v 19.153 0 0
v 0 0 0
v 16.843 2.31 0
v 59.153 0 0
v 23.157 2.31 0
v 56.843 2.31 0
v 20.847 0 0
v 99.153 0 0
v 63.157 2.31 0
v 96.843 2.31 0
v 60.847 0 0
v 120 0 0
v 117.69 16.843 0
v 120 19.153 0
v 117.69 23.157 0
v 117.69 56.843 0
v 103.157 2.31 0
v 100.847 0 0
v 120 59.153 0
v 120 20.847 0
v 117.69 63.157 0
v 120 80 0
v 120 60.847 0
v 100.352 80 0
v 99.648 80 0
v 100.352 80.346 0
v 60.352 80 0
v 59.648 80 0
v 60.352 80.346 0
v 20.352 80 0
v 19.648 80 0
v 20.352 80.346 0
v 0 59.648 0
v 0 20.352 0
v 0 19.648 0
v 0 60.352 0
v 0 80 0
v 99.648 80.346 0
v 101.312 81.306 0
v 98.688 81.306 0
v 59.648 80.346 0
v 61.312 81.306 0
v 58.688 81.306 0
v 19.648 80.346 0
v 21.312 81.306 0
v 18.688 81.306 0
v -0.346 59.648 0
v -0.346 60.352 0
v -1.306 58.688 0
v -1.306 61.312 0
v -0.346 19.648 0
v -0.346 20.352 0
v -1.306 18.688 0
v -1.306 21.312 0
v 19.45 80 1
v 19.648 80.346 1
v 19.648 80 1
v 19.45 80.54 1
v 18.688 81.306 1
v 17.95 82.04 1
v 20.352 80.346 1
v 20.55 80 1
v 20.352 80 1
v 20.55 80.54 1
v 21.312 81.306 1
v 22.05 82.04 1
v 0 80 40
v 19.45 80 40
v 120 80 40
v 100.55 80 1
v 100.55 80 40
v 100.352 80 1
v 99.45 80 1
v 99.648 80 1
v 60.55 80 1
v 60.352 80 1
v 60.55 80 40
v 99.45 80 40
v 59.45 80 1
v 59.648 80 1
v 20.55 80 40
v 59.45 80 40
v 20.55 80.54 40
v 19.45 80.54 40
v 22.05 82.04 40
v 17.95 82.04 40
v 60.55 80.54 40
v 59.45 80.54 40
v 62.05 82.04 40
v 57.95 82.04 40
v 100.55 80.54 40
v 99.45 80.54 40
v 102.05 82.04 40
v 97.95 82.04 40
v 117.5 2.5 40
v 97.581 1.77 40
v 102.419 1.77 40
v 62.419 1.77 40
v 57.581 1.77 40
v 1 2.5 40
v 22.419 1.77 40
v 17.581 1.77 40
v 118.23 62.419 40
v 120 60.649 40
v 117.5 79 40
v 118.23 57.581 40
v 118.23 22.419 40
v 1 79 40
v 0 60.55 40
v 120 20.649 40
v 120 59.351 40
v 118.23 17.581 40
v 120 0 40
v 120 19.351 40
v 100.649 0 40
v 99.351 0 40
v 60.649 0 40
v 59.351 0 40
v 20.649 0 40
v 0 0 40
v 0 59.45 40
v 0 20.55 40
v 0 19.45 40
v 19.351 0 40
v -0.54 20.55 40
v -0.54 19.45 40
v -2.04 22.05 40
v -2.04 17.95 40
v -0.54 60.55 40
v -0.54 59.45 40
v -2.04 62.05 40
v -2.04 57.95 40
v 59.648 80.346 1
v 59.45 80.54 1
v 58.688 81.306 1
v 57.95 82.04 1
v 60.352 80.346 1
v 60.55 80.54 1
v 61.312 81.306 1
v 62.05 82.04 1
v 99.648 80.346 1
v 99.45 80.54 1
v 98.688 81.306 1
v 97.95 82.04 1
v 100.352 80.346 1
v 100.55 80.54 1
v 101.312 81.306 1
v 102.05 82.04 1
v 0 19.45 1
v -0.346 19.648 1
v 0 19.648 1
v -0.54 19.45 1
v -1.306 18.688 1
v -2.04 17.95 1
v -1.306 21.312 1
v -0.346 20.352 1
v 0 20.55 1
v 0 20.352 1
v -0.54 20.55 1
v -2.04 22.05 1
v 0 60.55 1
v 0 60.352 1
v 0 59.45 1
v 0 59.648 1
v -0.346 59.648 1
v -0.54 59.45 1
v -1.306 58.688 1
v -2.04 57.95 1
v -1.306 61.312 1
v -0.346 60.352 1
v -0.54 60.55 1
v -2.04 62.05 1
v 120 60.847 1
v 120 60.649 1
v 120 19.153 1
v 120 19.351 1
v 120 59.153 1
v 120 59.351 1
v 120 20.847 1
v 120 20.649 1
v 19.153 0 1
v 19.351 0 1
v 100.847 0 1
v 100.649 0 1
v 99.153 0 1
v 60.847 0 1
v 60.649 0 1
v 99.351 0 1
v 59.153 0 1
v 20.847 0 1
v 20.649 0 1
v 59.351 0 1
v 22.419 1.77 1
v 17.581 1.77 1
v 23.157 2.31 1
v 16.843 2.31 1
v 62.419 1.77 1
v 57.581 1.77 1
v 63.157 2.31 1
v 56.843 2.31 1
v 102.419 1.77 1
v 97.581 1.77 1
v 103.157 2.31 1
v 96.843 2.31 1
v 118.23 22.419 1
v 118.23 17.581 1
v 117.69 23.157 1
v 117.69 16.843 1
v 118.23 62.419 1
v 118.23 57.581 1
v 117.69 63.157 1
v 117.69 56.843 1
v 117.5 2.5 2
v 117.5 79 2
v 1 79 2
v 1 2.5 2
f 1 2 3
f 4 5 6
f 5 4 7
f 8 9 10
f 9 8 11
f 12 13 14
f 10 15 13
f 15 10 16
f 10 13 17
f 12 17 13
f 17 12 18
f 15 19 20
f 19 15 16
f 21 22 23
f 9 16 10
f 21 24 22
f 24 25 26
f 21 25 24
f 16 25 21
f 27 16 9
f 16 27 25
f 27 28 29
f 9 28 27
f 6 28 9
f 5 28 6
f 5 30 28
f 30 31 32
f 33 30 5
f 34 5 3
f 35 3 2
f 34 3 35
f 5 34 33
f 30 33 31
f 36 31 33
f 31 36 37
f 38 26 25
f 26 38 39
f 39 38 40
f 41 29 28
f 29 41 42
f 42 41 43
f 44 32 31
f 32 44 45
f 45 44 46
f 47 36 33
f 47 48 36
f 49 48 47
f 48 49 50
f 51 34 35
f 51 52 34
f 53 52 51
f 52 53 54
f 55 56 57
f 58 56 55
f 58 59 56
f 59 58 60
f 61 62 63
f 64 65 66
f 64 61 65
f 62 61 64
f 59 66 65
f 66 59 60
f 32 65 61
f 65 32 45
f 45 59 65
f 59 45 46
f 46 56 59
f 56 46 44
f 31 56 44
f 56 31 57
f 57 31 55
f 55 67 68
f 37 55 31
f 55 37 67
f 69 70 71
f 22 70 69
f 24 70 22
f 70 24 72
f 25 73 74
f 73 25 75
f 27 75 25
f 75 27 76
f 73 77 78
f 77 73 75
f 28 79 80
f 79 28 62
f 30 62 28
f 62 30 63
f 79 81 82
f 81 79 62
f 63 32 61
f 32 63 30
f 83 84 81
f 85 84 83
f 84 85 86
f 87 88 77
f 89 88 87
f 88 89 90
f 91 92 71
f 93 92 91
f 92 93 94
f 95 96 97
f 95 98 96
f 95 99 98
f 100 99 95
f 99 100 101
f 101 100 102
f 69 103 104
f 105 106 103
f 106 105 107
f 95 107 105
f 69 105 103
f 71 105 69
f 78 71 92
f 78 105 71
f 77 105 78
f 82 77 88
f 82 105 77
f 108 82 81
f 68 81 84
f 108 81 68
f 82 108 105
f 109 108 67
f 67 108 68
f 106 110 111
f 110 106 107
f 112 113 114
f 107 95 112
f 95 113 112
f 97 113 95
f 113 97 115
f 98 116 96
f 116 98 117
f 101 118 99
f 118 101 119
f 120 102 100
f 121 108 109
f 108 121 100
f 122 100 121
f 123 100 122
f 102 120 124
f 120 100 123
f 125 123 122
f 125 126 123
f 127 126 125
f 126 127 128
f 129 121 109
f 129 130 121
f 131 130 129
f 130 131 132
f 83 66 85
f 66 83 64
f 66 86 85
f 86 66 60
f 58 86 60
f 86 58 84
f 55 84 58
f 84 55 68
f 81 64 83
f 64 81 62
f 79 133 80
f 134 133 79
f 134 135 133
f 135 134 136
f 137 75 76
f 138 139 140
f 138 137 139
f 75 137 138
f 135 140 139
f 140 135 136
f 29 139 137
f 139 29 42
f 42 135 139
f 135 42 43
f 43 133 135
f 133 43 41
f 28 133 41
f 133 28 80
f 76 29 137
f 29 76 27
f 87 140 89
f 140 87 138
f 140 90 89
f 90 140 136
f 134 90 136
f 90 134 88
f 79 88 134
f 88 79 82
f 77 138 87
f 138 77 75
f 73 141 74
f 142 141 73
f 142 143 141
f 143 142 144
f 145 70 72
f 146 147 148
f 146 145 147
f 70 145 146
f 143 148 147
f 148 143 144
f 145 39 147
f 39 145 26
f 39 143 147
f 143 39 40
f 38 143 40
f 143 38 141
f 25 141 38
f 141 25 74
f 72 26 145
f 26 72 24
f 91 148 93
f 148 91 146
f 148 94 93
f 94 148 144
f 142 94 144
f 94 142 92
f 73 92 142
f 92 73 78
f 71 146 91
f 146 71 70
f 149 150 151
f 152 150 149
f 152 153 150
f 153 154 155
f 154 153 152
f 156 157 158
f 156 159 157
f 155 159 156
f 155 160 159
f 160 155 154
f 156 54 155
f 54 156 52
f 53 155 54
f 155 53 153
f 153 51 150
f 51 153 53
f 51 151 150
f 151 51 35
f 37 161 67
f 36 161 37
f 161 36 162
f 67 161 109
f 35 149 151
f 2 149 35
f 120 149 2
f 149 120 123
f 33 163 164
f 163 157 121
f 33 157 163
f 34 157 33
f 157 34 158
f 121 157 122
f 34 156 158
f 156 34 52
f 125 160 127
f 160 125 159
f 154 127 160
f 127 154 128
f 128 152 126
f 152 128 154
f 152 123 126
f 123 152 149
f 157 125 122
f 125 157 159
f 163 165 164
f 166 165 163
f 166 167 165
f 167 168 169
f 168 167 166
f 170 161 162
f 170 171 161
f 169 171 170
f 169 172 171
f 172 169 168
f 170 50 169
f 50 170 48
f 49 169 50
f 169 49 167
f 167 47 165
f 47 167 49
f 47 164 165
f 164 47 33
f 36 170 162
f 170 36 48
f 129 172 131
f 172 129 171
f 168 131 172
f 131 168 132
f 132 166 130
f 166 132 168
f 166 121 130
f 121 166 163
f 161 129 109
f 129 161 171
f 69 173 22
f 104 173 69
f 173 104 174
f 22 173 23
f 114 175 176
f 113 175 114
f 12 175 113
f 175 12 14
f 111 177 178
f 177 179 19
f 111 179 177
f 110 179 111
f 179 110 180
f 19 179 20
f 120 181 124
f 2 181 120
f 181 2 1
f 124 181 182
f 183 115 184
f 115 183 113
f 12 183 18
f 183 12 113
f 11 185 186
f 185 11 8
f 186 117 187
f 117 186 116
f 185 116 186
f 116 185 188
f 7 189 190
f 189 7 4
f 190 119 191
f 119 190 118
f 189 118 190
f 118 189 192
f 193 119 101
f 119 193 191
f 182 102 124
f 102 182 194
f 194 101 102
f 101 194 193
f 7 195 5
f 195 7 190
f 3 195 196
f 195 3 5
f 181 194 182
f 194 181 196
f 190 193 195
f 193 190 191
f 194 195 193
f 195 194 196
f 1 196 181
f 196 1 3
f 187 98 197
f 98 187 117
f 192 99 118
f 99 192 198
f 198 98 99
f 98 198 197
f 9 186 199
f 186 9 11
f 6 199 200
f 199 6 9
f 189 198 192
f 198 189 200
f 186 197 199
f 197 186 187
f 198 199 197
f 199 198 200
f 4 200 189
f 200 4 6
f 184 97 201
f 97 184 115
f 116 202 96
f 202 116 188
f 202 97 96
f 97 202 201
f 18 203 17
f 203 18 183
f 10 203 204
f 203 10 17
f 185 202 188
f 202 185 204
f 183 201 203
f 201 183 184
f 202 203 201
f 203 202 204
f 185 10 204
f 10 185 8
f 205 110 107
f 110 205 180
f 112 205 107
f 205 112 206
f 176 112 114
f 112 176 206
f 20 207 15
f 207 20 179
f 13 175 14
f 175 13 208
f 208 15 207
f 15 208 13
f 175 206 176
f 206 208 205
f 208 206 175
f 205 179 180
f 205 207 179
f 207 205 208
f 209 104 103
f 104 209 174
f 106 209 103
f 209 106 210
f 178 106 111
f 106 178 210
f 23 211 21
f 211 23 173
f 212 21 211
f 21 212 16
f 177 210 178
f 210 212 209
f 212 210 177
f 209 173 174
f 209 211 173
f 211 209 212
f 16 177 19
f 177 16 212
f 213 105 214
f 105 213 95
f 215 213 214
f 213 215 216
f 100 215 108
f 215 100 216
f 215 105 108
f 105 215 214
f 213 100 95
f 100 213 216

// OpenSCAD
//this section defines a module for creating a "rounded" bottom to the box, useful when storing small parts
module RoundBottom(width, length, height){    
    translate([0,length,0])rotate([90,0,0])
    linear_extrude(length, center=false)
    
    difference() {
        translate([-width/2,0,0])square([width,height/2],center=false);
        translate([0,height/2,0])resize([width,height]) circle(d=width*10);
    }
}


module interlockingbox(
    //Box Width in units
    BoxWidthUnits = 3,
    //Box Length in units
    BoxLengthUnits = 3,
    //Box Height in mm
    BoxHeight = 120,
    //Box Floor Thickness in mm
    BoxFloor = 2,
    //North Wall open or closed
    NorthWallOpen = 0, // [0:Closed, 1:Open]
    //South Wall open or closed
    SouthWallOpen = 0 // [0:Closed, 1:Open]
)
{
echo(version=version(2.0));
//comments: Version 2 adds anti-"elephant foot" scaling at bottom of dovetail sections
/* [Size] */
//Box unit size in mm. This defines the size of 1 'unit' for your box.
BoxUnits = 40;
BoxWidth = BoxWidthUnits * BoxUnits;
BoxLength = BoxLengthUnits * BoxUnits;
//Box Wall Thickness in mm
BoxWall = 1;
//Fit Factor. Greater factor = looser fit
FitFactor = 0.18;  // [0:0.05:0.4]
//RoundedBottom = "EW"; // [EW:East-West, NS:North-South]
RoundedBottom = ""; // [EW:East-West, NS:North-South]

/* [Walls] */

/* [Dovetail] */
//Dovetail inside length in mm
DTInsideLength = 1.1;
//Dovetail angle in degrees
DTAngle = 45;
//Dovetail width in mm
DTWidth = 1.5;

/* [Hidden] */
//This helps calculate the length of the 'long' side of the dovetail
DTx=tan(DTAngle)*DTWidth;
//This polygon defines the dovetail shape
DTShape = [[0,0],[DTInsideLength/2,0],[DTInsideLength/2+DTx,DTWidth],[-DTInsideLength/2-DTx,DTWidth],[-DTInsideLength/2,0]];



union(){
    //creates and transforms rounded bottom
    if (RoundedBottom=="EW") {
    translate([0,(BoxWidth/2)+BoxWall,BoxFloor])
    rotate([0,0,-90])
    RoundBottom(BoxWidth-DTWidth-(BoxWall),BoxLength-DTWidth-BoxWall,2*(BoxHeight-BoxFloor));
    }

    //creates rounded bottom oriented North-South
    if (RoundedBottom=="NS") {
    translate([(BoxLength/2)-BoxWall,DTWidth+BoxWall/2,BoxFloor])
    rotate([0,0,0])
    RoundBottom(BoxLength-DTWidth-(BoxWall),BoxWidth-DTWidth-BoxWall,2*(BoxHeight-BoxFloor));
    }

    //Creates main box,without round bottom
    difference(){
        
    union(){
        //main box
    cube([BoxLength,BoxWidth,BoxHeight], center=false);

        //male dovetails
    for (i=[1:BoxLengthUnits])
    translate([(i-1)*BoxUnits+(BoxUnits/2),BoxWidth,0])
        //in 2 sections. first section is slightly scaled down to counter "elephant foot"
        union(){
            linear_extrude(height=1, center=false)
                scale([1-(2*FitFactor),1-(2*FitFactor),1])
                union(){        
                    //this adds a slight offset to the male dovetail for a looser fit
                    translate([-DTInsideLength/2,0,0])
                    square([DTInsideLength,DTWidth]);
                    //main dovetail shape
                    translate([0,DTWidth*FitFactor*2,0])
                    polygon(DTShape);
                };
            translate([0,0,1])
            linear_extrude(height=BoxHeight-1, center=false)
                    union(){
                    //this adds a slight offset to the male dovetail for a looser fit
                    translate([-DTInsideLength/2,0,0])
                    square([DTInsideLength,DTWidth]);
                    //main dovetail shape
                    translate([0,DTWidth*FitFactor*2,0])
                    polygon(DTShape);
                    };
        }        

    for (i=[1:BoxWidthUnits])
    translate([0,(i-1)*BoxUnits+(BoxUnits/2),0])
        //in 2 sections. first section is slightly scaled down to counter "elephant foot"
        rotate([0,0,90])
        union(){
            linear_extrude(height=1, center=false)				//1mm high anti-elephant foot section
                scale([1-(2*FitFactor),1-(2*FitFactor),1])
                union(){        
                    //this adds a slight offset to the male dovetail for a looser fit
                    translate([-DTInsideLength/2,0,0])
                    square([DTInsideLength,DTWidth]);
                    //main dovetail shape
                    translate([0,DTWidth*FitFactor*2,0])
                    polygon(DTShape);
                };
            translate([0,0,1])
            linear_extrude(height=BoxHeight-1, center=false)
                union(){
                    //male dovetail offset
                    translate([-DTInsideLength/2,0,0])
                    square([DTInsideLength,DTWidth]);
                    //main dovetail shape
                    translate([0,DTWidth*FitFactor*2,0])
                    polygon(DTShape);
                };
        }
    }
    //female dovetails
    for (i=[1:BoxLengthUnits])
        union(){
            translate([(i-1)*BoxUnits+(BoxUnits/2),0,0])
                scale([1+FitFactor,1+FitFactor,1])
                linear_extrude(height=BoxHeight, center=false)
                polygon(DTShape);
        
            //added a second dovetail cutout at the bottom, scaled up to counter "elephant foot" when printed
            translate([(i-1)*BoxUnits+(BoxUnits/2),0,0])
                scale([1+(3*FitFactor),1+(3*FitFactor),1])
                linear_extrude(height=1, center=false)
                polygon(DTShape);					
        }

    for (i=[1:BoxWidthUnits])
        union(){
            translate([BoxLength,(i-1)*BoxUnits+(BoxUnits/2),0])
                rotate([0,0,90])
                    scale([1+FitFactor,1+FitFactor,1])
                        linear_extrude(height=BoxHeight, center=false)
                            polygon(DTShape);
            //added a second dovetail cutout at the bottom, scaled up to counter "elephant foot" when printed
            translate([BoxLength,(i-1)*BoxUnits+(BoxUnits/2),0])
                rotate([0,0,90])
                    scale([1+(3*FitFactor),1+(3*FitFactor),1])
                        linear_extrude(height=1, center=false)
                            polygon(DTShape);	
        }
    //carves out main box
    translate([BoxWall,DTWidth+BoxWall,BoxFloor])
        cube([BoxLength-(2*BoxWall)-DTWidth, (BoxWidth-(2*BoxWall)-DTWidth), BoxHeight]);

    if (NorthWallOpen)
        translate([-DTWidth*(1+FitFactor+FitFactor),BoxWall+DTWidth,BoxFloor])
            cube([BoxWall+(DTWidth*(1+FitFactor+FitFactor)), (BoxWidth-(2*BoxWall)-DTWidth), BoxHeight]);    

    if (SouthWallOpen)
        translate([BoxLength-(BoxWall)-DTWidth,BoxWall+DTWidth,BoxFloor])
            cube([BoxWall+DTWidth, (BoxWidth-(2*BoxWall)-DTWidth), BoxHeight]);

    }
  }
}

// Cutout to make sure the actual box with groves is properly printed
// Use this with difference() to remove trim internal to fit the box.
module negativeBox(
    //Box Width in units
    BoxWidthUnits = 3,
    //Box Length in units
    BoxLengthUnits = 3,
    //Box Height in mm
    BoxHeight = 120,
    //Box unit size in mm. This defines the size of 1 'unit' for your box.
    BoxUnits = 40,
)
{
    difference () {
        translate([-5,-3,0])
        cube([BoxLengthUnits*BoxUnits+8,BoxWidthUnits*BoxUnits+8,BoxHeight]);

    translate([0.5,2,0])
        cube([BoxLengthUnits*BoxUnits-2.5,BoxWidthUnits*BoxUnits-2.5,BoxHeight]);
    }
}

interlockingbox(2,3,40);

// This will create a sliver of a wall if working properly
//difference() {
//    interlockingbox(2,3,40);
//    negativeBox(2,3,40);
//}
